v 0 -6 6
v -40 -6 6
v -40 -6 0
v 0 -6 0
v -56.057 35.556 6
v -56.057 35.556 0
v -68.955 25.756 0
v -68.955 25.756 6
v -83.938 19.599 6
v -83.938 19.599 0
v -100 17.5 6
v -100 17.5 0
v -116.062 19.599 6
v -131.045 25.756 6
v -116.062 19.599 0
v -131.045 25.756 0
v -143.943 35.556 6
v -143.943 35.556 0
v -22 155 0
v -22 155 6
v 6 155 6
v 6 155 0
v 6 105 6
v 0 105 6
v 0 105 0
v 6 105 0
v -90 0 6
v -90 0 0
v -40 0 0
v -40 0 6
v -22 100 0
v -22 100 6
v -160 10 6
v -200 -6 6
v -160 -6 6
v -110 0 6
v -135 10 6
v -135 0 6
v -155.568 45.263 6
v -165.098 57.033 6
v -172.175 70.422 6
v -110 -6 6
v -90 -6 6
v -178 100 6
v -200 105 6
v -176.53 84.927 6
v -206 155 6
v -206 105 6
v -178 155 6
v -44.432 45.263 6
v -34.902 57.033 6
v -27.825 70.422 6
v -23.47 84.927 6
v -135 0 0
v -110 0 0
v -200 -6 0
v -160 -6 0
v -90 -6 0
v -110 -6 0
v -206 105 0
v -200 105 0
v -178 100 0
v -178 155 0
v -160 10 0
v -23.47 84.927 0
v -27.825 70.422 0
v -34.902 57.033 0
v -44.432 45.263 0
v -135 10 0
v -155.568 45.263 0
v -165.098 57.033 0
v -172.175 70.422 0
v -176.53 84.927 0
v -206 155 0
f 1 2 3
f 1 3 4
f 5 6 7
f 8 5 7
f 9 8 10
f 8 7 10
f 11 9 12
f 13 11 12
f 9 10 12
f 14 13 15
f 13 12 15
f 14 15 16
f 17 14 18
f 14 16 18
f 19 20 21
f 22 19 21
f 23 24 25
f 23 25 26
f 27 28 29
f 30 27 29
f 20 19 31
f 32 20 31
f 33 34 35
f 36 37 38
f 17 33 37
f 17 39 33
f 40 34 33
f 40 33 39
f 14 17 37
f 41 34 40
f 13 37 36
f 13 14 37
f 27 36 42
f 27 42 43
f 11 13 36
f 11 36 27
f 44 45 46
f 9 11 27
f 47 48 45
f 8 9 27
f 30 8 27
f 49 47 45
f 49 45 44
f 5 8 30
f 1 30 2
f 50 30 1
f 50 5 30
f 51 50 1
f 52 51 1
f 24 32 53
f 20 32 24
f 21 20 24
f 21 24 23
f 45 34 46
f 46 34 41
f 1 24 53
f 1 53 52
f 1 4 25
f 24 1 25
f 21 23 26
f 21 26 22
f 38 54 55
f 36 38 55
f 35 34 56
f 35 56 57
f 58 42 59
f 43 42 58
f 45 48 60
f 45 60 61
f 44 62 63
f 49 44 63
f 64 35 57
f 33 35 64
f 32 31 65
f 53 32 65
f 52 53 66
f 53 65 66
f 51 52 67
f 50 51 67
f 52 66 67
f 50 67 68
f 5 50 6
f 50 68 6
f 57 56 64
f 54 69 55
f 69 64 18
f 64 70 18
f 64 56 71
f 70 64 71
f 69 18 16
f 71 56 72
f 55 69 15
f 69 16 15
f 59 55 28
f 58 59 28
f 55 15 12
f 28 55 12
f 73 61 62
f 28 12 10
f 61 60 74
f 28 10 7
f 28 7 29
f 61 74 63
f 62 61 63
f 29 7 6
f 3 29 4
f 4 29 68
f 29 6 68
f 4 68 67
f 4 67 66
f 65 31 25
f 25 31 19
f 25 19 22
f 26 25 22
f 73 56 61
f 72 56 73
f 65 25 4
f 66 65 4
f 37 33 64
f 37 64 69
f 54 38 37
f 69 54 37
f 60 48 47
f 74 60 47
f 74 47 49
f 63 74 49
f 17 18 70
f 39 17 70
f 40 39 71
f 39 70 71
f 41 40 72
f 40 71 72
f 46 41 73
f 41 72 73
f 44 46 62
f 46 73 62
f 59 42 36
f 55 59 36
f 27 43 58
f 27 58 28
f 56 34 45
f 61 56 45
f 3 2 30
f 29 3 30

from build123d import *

# Parameters (mm, degrees)
BOSS_EXTRUDE1_DEPTH = 6
SKETCH3_W           = 6
SKETCH3_H           = 50
BOSS_EXTRUDE2_DEPTH = 6
LPATTERN1_COUNT     = 2
LPATTERN1_PITCH     = 206
SKETCH4_W           = 40
SKETCH4_H           = 6
SKETCH4_W_2         = 20
BOSS_EXTRUDE3_DEPTH = 6
SKETCH5_W           = 25
SKETCH5_H           = 10
CUT_EXTRUDE1_DEPTH  = 10


with BuildPart() as part:
    # Sketch1 → Boss-Extrude1 (new body)
    with BuildSketch(Plane.XY):
        with BuildLine():
            Line((-178, 100), (-178, 155))
            Line((-178, 155), (-200, 155))
            Line((-200, 155), (-200, 0))
            Line((-200, 0), (0, 0))
            Line((0, 0), (0, 155))
            Line((0, 155), (-22, 155))
            Line((-22, 155), (-22, 100))
            ThreePointArc((-22, 100), (-31.037807258, 63.555302549), (-56.056819802, 35.55625))
            ThreePointArc((-56.056819802, 35.55625), (-100, 17.5), (-143.943180198, 35.55625))
            ThreePointArc((-143.943180198, 35.55625), (-168.962192742, 63.555302549), (-178, 100))
        make_face()
    extrude(amount=BOSS_EXTRUDE1_DEPTH)

    # Sketch3 → Boss-Extrude2 (add)
    with BuildSketch(Plane.XY.offset(6)):
        with Locations((-203, 130)):
            Rectangle(SKETCH3_W, SKETCH3_H)
    boss_extrude2 = extrude(amount=-BOSS_EXTRUDE2_DEPTH)

    # LPattern1: Boss-Extrude2 ×2
    with Locations(*[(i * LPATTERN1_PITCH, 0, 0) for i in range(1, LPATTERN1_COUNT)]):
        add(boss_extrude2)

    # Sketch4 → Boss-Extrude3 (add)
    with BuildSketch(Plane.XY.offset(6)):
        with Locations((-180, -3)):
            Rectangle(SKETCH4_W, SKETCH4_H)
        with Locations((-100, -3)):
            Rectangle(SKETCH4_W_2, SKETCH4_H)
        with Locations((-20, -3)):
            Rectangle(SKETCH4_W, SKETCH4_H)
    extrude(amount=-BOSS_EXTRUDE3_DEPTH)

    # Sketch5 → Cut-Extrude1 (cut)
    with BuildSketch(Plane.XY.offset(6)):
        with Locations((-147.5, 5)):
            Rectangle(SKETCH5_W, SKETCH5_H)
    extrude(amount=-CUT_EXTRUDE1_DEPTH, mode=Mode.SUBTRACT)


solid = part.part
